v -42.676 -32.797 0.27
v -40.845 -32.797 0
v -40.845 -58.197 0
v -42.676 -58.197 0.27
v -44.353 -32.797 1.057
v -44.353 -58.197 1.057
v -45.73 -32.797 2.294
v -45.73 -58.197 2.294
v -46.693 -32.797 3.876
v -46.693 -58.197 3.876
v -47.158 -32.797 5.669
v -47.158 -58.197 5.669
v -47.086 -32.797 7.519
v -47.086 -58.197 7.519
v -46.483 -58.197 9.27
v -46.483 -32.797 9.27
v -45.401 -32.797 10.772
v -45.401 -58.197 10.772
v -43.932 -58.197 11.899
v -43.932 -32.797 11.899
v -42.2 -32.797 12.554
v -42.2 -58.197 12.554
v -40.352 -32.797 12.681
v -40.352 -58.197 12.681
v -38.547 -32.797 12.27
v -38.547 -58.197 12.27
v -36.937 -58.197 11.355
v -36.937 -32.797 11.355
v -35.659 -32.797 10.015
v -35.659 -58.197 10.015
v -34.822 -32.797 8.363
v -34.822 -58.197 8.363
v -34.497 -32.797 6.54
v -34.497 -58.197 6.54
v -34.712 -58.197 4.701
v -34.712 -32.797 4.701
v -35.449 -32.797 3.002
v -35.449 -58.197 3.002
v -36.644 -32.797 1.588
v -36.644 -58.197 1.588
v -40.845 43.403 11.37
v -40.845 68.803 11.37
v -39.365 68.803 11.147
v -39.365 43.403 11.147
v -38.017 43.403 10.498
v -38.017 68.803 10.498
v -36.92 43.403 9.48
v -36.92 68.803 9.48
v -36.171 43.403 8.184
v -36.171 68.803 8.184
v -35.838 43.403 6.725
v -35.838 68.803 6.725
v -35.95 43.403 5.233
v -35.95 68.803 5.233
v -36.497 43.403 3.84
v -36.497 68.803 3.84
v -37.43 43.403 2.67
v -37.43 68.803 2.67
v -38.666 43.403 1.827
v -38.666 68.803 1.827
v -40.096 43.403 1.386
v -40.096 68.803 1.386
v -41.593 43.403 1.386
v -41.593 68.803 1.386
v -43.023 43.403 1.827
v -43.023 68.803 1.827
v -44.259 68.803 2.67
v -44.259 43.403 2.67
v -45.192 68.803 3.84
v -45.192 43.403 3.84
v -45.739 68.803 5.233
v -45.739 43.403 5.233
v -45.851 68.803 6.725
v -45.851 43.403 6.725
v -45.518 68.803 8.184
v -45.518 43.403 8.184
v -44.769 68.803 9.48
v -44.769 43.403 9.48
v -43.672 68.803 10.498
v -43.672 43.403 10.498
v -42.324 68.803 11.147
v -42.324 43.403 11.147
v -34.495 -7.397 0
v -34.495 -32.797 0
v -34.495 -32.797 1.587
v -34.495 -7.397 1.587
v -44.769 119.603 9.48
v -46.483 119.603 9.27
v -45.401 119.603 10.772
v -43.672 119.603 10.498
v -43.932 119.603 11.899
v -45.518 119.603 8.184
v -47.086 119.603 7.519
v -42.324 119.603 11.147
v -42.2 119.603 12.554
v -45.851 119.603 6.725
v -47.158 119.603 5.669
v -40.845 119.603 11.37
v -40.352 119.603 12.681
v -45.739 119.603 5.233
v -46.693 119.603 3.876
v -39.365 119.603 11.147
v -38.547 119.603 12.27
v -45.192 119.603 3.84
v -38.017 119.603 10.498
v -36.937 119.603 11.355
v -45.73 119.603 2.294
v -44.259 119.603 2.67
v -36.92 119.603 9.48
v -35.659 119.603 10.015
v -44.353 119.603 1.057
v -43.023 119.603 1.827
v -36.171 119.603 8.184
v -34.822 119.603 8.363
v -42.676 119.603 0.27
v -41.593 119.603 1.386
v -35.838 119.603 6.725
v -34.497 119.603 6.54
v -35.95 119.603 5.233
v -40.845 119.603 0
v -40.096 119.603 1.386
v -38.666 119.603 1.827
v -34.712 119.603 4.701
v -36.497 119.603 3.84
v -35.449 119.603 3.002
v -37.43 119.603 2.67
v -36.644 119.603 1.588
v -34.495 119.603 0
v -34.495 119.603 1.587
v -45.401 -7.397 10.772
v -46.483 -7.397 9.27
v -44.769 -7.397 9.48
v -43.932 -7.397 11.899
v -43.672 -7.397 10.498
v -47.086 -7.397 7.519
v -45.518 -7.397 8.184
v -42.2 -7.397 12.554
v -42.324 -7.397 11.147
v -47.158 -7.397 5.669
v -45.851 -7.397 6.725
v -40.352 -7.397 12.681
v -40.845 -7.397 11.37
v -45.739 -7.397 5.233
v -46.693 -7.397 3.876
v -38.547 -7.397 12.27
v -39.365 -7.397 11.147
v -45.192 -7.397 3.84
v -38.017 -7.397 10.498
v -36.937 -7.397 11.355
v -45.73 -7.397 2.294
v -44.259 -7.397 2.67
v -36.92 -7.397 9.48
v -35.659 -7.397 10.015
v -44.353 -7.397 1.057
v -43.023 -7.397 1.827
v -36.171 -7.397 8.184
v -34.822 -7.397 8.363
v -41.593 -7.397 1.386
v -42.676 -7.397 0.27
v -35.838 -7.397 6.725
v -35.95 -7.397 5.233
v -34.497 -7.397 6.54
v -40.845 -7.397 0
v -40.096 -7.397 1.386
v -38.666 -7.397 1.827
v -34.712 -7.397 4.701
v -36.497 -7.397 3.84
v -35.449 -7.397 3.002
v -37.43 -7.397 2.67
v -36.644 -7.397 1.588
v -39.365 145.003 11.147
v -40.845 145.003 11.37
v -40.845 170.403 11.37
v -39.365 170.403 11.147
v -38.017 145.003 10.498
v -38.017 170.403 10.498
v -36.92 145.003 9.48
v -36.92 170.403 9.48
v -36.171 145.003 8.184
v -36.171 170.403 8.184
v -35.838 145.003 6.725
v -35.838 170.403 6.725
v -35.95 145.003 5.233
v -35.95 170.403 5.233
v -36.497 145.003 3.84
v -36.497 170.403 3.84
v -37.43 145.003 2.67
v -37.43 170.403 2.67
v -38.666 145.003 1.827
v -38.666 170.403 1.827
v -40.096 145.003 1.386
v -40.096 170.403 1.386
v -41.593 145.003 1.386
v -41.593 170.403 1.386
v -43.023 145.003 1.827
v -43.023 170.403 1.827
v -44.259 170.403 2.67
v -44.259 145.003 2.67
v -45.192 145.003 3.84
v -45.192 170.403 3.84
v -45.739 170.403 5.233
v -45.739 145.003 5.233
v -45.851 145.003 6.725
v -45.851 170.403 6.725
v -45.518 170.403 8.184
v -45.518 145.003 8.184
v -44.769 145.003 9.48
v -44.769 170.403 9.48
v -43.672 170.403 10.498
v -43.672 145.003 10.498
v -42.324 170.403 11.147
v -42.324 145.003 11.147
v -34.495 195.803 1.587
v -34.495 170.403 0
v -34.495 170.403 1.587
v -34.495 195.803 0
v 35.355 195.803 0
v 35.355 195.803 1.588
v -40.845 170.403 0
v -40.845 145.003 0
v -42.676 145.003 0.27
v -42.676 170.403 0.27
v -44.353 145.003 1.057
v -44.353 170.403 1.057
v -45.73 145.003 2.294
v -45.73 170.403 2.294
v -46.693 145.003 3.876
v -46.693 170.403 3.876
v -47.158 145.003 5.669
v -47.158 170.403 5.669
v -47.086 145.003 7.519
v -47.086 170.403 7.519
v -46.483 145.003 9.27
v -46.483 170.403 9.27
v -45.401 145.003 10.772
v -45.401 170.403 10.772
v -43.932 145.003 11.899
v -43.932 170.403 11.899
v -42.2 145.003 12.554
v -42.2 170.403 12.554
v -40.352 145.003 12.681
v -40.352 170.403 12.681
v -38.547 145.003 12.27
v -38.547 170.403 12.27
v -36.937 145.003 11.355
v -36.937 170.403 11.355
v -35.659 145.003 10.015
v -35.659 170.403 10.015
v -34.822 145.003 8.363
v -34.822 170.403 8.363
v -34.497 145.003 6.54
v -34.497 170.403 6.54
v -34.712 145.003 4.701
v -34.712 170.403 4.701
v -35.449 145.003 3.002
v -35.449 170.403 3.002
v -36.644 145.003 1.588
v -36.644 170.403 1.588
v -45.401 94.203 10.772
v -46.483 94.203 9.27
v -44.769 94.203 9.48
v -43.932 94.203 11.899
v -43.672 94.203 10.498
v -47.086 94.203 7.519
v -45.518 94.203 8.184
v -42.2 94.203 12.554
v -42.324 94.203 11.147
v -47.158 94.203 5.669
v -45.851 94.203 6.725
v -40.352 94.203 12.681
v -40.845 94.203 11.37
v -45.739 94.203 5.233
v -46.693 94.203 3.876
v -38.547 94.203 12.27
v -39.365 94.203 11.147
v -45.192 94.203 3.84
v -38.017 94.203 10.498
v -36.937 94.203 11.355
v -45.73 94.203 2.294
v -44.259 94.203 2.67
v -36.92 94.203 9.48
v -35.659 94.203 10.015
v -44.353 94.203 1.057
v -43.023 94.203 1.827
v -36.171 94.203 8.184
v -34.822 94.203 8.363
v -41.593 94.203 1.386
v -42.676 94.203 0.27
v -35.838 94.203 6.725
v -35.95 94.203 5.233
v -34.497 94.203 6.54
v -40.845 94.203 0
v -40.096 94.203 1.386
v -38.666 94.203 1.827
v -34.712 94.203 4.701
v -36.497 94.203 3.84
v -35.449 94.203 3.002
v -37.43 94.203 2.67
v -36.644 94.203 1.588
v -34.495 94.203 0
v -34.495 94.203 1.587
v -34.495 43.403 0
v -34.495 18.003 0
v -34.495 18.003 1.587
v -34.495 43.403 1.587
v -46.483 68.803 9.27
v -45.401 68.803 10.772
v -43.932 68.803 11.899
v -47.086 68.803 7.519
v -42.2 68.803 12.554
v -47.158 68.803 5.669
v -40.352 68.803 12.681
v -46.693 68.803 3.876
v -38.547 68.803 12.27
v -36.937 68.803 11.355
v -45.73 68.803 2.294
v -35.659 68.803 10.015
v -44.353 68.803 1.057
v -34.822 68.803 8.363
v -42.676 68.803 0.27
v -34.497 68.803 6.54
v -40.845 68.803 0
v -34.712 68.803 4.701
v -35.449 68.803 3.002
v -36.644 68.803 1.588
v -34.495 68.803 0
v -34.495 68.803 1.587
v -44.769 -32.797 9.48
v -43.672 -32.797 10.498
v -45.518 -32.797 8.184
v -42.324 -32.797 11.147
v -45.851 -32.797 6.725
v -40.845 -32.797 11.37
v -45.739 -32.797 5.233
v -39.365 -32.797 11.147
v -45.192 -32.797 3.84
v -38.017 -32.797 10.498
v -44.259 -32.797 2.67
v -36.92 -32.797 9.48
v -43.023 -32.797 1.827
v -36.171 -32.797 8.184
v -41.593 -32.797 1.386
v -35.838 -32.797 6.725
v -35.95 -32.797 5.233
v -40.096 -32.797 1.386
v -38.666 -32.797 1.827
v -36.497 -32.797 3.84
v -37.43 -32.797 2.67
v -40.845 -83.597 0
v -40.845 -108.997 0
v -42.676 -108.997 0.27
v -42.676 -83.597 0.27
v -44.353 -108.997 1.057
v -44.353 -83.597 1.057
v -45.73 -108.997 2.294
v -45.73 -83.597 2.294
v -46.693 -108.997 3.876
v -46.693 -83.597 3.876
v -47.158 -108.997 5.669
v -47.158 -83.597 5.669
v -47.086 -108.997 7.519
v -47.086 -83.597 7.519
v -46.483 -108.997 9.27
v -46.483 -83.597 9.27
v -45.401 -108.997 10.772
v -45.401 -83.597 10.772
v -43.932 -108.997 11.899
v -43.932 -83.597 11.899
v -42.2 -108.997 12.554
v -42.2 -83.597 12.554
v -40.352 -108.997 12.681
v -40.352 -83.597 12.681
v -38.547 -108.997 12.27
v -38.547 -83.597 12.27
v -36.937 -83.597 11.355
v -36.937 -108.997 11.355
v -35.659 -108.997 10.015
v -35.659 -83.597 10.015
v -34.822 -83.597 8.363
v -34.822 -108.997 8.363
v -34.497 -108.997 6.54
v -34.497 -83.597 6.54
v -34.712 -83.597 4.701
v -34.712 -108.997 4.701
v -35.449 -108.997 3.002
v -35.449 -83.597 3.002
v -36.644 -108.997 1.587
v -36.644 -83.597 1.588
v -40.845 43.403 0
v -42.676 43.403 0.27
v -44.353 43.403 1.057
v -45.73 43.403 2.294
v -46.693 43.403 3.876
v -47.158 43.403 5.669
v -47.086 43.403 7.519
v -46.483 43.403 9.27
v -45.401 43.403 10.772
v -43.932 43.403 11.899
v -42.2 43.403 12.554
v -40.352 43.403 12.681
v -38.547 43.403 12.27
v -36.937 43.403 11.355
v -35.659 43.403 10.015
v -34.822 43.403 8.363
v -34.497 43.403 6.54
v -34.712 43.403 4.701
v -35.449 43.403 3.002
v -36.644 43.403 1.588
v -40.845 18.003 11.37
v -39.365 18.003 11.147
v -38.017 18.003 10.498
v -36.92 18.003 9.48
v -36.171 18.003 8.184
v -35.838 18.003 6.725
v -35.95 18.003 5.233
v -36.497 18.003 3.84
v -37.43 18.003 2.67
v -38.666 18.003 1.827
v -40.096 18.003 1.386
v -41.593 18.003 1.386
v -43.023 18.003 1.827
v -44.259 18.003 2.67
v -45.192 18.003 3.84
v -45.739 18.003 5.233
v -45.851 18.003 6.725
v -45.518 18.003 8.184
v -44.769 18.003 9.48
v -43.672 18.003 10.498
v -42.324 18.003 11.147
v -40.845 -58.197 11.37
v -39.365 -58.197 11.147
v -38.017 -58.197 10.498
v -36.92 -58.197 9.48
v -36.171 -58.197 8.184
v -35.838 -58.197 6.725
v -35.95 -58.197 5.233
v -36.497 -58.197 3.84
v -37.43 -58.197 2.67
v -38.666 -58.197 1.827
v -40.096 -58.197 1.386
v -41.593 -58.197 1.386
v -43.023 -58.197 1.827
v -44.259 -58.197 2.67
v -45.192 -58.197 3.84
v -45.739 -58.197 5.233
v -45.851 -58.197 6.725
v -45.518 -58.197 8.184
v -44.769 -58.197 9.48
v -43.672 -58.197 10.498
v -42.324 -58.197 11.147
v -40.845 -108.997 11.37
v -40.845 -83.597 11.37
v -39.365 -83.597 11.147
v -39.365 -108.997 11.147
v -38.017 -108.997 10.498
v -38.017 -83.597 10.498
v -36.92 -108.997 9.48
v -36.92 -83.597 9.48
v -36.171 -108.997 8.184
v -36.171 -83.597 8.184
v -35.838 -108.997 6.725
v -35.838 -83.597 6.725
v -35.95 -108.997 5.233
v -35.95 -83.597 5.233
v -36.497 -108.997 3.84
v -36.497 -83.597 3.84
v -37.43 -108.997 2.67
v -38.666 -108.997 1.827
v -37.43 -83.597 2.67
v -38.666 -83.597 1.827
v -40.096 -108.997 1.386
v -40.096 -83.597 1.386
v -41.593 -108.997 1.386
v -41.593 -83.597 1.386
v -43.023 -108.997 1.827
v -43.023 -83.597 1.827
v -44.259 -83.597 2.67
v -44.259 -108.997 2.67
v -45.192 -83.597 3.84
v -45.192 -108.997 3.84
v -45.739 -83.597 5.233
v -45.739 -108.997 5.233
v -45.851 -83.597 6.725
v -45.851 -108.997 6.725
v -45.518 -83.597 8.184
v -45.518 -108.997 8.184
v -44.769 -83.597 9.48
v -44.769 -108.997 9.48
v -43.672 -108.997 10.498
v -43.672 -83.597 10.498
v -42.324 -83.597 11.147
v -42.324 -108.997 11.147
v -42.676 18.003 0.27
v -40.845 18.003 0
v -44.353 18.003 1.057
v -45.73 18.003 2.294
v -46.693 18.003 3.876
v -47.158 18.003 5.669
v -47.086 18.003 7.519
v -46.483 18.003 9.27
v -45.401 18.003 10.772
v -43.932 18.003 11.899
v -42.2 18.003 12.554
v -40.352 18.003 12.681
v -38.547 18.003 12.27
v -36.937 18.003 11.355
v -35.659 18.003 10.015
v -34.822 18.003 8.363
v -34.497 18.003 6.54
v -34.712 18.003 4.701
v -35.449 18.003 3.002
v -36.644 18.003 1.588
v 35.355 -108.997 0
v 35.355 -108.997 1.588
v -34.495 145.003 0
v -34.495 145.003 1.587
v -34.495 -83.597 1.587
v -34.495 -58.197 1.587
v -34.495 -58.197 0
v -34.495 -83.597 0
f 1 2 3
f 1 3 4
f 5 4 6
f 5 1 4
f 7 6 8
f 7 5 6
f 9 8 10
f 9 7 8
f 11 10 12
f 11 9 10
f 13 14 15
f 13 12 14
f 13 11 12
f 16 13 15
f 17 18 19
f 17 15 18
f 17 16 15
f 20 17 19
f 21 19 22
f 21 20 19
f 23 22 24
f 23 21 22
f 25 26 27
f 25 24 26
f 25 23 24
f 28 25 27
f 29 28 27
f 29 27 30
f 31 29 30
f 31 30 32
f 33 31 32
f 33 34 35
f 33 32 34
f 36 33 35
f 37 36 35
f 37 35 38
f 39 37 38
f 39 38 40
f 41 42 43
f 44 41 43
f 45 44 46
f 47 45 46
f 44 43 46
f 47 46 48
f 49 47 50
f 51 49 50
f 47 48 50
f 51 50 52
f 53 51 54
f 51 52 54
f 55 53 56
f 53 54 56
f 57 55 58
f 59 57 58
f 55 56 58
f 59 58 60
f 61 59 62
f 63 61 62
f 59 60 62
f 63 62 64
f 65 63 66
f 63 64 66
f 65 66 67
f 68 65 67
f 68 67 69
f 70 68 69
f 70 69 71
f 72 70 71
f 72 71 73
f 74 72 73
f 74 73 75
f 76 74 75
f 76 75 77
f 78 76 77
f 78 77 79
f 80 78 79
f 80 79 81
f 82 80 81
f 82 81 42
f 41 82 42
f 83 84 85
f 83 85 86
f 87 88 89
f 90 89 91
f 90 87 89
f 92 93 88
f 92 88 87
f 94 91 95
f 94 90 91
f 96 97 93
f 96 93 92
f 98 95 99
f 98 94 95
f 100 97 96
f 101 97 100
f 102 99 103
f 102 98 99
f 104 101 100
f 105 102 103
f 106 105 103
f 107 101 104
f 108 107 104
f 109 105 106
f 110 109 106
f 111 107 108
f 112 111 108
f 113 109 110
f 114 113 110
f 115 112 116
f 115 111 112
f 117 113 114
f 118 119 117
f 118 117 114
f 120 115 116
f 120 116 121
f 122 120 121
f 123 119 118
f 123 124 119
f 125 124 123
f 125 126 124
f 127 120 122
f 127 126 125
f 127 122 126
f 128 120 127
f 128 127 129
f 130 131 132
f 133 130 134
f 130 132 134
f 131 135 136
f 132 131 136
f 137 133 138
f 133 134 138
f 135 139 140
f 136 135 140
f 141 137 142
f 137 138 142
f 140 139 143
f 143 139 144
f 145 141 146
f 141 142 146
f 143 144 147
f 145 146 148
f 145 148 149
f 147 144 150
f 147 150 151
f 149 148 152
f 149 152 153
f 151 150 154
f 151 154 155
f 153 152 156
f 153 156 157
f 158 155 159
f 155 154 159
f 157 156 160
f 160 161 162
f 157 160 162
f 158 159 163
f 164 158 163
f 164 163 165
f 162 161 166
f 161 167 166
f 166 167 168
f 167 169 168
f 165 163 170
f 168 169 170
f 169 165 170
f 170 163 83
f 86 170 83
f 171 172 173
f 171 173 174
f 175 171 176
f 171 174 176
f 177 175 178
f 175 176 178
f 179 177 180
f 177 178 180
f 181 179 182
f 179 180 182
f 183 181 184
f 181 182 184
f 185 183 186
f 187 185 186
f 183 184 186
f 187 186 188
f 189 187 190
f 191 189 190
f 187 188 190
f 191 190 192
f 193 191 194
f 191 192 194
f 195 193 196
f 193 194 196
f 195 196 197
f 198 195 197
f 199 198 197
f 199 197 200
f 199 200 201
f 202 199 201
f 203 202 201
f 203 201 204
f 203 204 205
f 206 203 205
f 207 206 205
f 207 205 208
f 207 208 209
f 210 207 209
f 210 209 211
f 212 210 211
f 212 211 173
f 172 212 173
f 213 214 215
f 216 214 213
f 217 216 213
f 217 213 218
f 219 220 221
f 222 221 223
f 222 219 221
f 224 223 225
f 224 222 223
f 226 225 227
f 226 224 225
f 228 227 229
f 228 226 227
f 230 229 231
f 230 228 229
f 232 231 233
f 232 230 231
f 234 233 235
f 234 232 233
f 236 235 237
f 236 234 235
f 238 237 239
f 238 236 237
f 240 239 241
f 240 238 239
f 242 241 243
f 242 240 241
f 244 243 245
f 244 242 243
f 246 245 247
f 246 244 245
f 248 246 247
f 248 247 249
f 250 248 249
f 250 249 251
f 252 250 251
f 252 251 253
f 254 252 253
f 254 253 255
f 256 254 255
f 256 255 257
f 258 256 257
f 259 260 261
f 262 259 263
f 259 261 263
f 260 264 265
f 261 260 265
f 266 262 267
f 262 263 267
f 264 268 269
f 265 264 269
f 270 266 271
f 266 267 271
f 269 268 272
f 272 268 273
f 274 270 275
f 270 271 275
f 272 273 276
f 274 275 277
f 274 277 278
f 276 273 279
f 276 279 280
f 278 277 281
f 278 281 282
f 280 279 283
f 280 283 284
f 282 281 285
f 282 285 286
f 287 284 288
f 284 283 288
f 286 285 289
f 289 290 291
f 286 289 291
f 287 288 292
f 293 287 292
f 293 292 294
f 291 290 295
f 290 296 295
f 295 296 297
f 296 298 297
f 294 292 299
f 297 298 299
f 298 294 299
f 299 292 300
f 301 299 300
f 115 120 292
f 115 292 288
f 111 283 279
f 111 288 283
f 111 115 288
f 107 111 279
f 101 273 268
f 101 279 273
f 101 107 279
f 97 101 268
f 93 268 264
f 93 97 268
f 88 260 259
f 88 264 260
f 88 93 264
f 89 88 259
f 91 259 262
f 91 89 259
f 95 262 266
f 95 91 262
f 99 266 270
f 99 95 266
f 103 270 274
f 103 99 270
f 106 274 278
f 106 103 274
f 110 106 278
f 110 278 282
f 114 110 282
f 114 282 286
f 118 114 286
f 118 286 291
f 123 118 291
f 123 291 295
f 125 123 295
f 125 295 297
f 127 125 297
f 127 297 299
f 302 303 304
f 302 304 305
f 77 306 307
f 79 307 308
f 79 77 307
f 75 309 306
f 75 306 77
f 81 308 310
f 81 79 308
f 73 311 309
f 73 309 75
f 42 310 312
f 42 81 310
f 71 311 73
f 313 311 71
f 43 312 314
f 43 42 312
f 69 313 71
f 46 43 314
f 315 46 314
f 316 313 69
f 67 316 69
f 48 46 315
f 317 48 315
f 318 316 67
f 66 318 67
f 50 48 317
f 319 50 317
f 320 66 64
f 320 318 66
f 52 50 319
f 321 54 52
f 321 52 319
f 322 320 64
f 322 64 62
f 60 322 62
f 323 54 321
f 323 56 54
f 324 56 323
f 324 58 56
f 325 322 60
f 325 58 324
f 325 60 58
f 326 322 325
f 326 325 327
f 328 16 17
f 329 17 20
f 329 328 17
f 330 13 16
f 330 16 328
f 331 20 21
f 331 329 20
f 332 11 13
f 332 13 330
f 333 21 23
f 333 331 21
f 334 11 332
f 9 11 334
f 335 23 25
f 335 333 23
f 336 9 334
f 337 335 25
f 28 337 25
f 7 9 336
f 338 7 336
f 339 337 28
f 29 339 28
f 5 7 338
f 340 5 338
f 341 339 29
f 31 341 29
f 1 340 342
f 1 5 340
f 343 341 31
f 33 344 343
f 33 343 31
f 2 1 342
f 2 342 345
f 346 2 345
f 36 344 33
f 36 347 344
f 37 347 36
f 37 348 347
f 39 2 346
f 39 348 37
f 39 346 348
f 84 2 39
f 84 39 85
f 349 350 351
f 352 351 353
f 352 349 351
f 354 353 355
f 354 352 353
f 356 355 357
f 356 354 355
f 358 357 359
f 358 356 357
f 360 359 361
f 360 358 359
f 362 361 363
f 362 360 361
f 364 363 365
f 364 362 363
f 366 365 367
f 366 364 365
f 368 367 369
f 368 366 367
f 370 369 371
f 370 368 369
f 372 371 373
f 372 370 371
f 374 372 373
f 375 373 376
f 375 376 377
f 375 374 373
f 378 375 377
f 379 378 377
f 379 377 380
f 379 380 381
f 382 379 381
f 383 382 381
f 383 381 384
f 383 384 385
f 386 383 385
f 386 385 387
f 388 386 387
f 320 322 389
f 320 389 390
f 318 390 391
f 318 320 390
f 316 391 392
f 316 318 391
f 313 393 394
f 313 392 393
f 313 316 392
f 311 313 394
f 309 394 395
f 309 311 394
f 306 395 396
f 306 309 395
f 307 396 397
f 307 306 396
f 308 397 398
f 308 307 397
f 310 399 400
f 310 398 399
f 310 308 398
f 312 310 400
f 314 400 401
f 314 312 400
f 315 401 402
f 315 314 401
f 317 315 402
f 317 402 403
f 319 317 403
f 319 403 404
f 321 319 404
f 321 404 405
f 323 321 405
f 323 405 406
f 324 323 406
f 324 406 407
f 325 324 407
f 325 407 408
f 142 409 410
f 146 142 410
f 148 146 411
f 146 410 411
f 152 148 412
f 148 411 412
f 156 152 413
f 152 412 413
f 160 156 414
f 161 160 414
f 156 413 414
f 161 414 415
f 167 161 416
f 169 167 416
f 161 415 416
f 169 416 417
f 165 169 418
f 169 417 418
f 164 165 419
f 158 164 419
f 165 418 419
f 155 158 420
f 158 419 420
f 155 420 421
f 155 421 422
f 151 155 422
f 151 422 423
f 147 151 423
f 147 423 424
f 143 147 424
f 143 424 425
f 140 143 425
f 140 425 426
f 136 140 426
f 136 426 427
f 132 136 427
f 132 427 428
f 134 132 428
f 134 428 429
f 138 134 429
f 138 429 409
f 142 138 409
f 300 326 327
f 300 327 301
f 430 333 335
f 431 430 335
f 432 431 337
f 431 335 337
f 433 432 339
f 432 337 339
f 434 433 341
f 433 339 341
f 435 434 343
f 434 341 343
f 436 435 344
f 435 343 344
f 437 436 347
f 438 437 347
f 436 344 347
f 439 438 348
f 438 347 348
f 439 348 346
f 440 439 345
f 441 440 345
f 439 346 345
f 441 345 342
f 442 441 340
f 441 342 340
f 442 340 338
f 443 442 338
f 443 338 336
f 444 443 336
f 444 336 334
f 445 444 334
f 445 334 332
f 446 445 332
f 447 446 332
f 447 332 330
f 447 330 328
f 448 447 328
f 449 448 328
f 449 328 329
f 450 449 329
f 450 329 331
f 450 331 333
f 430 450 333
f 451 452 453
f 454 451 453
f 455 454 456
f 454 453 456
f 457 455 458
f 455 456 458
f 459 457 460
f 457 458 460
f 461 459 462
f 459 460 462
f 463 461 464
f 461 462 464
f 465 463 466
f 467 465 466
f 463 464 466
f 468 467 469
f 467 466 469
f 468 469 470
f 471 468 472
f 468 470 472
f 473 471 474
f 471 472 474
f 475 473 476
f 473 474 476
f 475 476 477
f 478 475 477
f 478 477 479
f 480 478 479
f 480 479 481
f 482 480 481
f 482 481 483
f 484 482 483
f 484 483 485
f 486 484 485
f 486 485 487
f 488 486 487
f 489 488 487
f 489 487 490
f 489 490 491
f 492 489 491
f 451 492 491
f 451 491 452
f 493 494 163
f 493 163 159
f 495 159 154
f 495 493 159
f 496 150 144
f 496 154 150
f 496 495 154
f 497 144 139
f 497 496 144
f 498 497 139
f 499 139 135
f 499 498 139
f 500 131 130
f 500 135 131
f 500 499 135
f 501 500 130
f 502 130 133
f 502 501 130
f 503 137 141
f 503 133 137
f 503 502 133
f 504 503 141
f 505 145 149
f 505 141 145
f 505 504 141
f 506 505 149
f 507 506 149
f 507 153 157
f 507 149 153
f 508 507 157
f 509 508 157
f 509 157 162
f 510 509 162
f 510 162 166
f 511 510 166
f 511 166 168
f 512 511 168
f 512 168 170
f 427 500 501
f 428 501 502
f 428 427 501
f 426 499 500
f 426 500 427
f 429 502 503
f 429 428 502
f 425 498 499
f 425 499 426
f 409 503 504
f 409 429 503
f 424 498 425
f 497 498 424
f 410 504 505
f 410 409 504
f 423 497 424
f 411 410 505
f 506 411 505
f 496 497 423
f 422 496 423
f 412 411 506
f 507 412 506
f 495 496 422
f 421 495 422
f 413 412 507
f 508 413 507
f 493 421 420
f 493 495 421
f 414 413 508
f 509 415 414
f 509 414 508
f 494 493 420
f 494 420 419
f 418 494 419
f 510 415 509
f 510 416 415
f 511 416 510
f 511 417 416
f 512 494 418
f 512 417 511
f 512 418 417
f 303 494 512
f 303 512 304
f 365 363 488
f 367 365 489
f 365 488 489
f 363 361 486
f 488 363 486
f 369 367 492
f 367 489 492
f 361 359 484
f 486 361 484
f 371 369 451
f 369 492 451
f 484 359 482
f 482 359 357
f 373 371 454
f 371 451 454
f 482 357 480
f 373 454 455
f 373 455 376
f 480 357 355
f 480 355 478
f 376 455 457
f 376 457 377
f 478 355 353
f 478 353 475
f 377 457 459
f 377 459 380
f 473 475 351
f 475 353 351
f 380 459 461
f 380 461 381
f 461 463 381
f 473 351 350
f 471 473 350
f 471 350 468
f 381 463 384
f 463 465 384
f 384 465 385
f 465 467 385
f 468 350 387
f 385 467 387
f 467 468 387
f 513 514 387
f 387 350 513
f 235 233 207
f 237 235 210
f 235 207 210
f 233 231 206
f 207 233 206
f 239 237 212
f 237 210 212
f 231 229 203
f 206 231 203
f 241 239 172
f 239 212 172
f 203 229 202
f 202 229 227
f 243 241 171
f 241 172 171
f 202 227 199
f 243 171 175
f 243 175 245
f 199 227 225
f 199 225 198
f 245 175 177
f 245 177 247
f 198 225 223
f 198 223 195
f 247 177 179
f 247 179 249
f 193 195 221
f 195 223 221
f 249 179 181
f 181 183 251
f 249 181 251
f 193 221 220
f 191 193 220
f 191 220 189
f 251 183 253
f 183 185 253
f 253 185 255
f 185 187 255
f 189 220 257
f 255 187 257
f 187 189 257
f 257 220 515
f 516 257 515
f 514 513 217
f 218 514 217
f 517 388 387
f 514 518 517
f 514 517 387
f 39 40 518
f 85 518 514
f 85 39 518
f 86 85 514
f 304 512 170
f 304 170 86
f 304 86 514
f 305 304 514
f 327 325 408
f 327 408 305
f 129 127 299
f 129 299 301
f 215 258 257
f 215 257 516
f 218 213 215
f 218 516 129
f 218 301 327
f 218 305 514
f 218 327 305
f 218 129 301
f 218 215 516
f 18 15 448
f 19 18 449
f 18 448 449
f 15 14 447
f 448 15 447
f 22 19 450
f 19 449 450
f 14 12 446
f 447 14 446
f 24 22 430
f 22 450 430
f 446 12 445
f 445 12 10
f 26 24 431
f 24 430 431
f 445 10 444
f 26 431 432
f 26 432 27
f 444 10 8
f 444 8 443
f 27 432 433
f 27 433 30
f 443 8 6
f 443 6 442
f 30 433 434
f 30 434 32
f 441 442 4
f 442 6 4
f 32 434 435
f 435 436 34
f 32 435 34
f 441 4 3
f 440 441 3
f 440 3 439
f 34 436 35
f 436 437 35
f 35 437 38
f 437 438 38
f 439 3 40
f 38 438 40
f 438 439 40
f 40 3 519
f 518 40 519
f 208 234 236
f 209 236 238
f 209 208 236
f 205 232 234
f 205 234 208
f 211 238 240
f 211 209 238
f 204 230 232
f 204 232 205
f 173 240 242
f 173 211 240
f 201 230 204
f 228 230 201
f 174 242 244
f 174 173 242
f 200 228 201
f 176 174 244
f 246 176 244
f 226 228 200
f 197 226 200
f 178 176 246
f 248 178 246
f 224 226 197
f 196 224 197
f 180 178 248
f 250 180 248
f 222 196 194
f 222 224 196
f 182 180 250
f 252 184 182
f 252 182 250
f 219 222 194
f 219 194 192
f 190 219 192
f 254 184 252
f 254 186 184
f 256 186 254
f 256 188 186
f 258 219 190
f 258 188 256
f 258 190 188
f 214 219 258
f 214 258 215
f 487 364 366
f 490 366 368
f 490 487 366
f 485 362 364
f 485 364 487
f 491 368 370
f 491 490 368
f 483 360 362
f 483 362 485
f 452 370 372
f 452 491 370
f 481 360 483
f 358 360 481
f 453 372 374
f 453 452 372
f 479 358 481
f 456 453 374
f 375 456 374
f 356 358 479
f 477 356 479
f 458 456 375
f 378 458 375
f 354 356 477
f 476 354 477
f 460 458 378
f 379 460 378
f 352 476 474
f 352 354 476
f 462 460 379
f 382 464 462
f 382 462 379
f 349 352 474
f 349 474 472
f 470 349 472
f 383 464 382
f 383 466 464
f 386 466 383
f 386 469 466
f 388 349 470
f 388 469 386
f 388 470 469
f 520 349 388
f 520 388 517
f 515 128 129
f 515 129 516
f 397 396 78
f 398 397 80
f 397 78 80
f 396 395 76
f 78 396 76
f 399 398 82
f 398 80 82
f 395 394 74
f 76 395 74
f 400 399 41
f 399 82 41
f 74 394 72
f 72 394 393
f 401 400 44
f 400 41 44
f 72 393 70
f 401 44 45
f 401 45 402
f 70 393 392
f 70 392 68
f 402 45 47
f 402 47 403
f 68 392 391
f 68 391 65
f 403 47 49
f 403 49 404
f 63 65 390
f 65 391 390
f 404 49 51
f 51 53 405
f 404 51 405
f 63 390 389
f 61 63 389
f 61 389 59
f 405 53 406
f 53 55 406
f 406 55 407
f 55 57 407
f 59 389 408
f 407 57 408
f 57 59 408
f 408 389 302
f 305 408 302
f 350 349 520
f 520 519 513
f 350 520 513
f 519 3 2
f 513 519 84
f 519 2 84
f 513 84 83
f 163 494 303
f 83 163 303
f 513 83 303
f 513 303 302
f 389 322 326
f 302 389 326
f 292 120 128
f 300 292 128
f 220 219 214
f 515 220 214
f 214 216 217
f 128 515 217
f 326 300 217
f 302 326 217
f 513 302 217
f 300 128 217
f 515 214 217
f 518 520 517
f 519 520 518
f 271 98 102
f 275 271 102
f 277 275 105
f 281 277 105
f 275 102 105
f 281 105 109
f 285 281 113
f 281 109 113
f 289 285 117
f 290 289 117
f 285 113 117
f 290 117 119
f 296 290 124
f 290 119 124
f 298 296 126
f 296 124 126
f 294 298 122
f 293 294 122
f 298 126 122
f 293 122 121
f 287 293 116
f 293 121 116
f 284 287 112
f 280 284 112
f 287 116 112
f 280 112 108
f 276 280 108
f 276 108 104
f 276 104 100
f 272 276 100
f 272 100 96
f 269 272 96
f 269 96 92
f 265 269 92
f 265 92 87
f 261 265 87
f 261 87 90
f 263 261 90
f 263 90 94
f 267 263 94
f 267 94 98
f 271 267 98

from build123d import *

# Parameters (mm, degrees)
SKETCH1_W               = 76.2
SKETCH1_H               = 304.8
BOSS_EXTRUDE1_DEPTH     = 1.5875
SKETCH2_R               = 6.35
BOSS_EXTRUDE2_DEPTH     = 304.8
CUT_EXTRUDE1_REACH      = 310.693
SKETCH5_R               = 5.020069527
CUT_EXTRUDE2_DEPTH      = 22.4155
CUT_EXTRUDE2_DEPTH_BACK = 22.4155
SKETCH6_W               = 31.253930699
SKETCH6_H               = 25.4
SKETCH6_W_2             = 35.598147882
SKETCH6_W_3             = 29.083231171


with BuildPart() as part:
    # Sketch1 → Boss-Extrude1 (new body)
    with BuildSketch(Plane.XY):
        with Locations((-2.744516439, 43.403238015)):
            Rectangle(SKETCH1_W, SKETCH1_H)
    extrude(amount=BOSS_EXTRUDE1_DEPTH)

    # Sketch2 → Boss-Extrude2 (add)
    with BuildSketch(Plane(origin=(0, 195.803238015, 0), x_dir=(1, 0, 0), z_dir=(0, 1, 0))):
        with Locations((-40.844516439, -6.35)):
            Circle(SKETCH2_R)
    extrude(amount=-BOSS_EXTRUDE2_DEPTH)

    # Sketch5 → Cut-Extrude1 (cut, up to next)
    with BuildSketch(Plane(origin=(0, 195.803238015, 0), x_dir=(1, 0, 0), z_dir=(0, 1, 0)), mode=Mode.PRIVATE) as cut_extrude1_sk1:
        with Locations(Location((-40.844516439, -6.35, 0), (0, 0, 270))):
            Circle(SKETCH5_R)
    cut_extrude1_tool1 = extrude(cut_extrude1_sk1.sketch, amount=-CUT_EXTRUDE1_REACH, mode=Mode.PRIVATE) & part.part
    add(cut_extrude1_tool1.solids().sort_by_distance((-40.844516, 195.803238, 6.35))[0], mode=Mode.SUBTRACT)

    # Sketch6 → Cut-Extrude2 (cut, two sides: drawn at the far end of the back side and taken through both)
    with BuildSketch(Plane.XY.offset(1.5875).offset(-CUT_EXTRUDE2_DEPTH_BACK)):
        with Locations((-50.121481789, 183.103238015)):
            Rectangle(SKETCH6_W, SKETCH6_H)
        with Locations((-50.121481789, 132.303238015)):
            Rectangle(SKETCH6_W, SKETCH6_H)
        with Locations((-50.121481789, 81.503238015)):
            Rectangle(SKETCH6_W, SKETCH6_H)
        with Locations((-50.121481789, 30.703238015)):
            Rectangle(SKETCH6_W, SKETCH6_H)
        with Locations((-52.29359038, -20.096761985)):
            Rectangle(SKETCH6_W_2, SKETCH6_H)
        with Locations((-49.036132025, -70.896761985)):
            Rectangle(SKETCH6_W_3, SKETCH6_H)
    extrude(amount=CUT_EXTRUDE2_DEPTH + CUT_EXTRUDE2_DEPTH_BACK, mode=Mode.SUBTRACT)


solid = part.part
